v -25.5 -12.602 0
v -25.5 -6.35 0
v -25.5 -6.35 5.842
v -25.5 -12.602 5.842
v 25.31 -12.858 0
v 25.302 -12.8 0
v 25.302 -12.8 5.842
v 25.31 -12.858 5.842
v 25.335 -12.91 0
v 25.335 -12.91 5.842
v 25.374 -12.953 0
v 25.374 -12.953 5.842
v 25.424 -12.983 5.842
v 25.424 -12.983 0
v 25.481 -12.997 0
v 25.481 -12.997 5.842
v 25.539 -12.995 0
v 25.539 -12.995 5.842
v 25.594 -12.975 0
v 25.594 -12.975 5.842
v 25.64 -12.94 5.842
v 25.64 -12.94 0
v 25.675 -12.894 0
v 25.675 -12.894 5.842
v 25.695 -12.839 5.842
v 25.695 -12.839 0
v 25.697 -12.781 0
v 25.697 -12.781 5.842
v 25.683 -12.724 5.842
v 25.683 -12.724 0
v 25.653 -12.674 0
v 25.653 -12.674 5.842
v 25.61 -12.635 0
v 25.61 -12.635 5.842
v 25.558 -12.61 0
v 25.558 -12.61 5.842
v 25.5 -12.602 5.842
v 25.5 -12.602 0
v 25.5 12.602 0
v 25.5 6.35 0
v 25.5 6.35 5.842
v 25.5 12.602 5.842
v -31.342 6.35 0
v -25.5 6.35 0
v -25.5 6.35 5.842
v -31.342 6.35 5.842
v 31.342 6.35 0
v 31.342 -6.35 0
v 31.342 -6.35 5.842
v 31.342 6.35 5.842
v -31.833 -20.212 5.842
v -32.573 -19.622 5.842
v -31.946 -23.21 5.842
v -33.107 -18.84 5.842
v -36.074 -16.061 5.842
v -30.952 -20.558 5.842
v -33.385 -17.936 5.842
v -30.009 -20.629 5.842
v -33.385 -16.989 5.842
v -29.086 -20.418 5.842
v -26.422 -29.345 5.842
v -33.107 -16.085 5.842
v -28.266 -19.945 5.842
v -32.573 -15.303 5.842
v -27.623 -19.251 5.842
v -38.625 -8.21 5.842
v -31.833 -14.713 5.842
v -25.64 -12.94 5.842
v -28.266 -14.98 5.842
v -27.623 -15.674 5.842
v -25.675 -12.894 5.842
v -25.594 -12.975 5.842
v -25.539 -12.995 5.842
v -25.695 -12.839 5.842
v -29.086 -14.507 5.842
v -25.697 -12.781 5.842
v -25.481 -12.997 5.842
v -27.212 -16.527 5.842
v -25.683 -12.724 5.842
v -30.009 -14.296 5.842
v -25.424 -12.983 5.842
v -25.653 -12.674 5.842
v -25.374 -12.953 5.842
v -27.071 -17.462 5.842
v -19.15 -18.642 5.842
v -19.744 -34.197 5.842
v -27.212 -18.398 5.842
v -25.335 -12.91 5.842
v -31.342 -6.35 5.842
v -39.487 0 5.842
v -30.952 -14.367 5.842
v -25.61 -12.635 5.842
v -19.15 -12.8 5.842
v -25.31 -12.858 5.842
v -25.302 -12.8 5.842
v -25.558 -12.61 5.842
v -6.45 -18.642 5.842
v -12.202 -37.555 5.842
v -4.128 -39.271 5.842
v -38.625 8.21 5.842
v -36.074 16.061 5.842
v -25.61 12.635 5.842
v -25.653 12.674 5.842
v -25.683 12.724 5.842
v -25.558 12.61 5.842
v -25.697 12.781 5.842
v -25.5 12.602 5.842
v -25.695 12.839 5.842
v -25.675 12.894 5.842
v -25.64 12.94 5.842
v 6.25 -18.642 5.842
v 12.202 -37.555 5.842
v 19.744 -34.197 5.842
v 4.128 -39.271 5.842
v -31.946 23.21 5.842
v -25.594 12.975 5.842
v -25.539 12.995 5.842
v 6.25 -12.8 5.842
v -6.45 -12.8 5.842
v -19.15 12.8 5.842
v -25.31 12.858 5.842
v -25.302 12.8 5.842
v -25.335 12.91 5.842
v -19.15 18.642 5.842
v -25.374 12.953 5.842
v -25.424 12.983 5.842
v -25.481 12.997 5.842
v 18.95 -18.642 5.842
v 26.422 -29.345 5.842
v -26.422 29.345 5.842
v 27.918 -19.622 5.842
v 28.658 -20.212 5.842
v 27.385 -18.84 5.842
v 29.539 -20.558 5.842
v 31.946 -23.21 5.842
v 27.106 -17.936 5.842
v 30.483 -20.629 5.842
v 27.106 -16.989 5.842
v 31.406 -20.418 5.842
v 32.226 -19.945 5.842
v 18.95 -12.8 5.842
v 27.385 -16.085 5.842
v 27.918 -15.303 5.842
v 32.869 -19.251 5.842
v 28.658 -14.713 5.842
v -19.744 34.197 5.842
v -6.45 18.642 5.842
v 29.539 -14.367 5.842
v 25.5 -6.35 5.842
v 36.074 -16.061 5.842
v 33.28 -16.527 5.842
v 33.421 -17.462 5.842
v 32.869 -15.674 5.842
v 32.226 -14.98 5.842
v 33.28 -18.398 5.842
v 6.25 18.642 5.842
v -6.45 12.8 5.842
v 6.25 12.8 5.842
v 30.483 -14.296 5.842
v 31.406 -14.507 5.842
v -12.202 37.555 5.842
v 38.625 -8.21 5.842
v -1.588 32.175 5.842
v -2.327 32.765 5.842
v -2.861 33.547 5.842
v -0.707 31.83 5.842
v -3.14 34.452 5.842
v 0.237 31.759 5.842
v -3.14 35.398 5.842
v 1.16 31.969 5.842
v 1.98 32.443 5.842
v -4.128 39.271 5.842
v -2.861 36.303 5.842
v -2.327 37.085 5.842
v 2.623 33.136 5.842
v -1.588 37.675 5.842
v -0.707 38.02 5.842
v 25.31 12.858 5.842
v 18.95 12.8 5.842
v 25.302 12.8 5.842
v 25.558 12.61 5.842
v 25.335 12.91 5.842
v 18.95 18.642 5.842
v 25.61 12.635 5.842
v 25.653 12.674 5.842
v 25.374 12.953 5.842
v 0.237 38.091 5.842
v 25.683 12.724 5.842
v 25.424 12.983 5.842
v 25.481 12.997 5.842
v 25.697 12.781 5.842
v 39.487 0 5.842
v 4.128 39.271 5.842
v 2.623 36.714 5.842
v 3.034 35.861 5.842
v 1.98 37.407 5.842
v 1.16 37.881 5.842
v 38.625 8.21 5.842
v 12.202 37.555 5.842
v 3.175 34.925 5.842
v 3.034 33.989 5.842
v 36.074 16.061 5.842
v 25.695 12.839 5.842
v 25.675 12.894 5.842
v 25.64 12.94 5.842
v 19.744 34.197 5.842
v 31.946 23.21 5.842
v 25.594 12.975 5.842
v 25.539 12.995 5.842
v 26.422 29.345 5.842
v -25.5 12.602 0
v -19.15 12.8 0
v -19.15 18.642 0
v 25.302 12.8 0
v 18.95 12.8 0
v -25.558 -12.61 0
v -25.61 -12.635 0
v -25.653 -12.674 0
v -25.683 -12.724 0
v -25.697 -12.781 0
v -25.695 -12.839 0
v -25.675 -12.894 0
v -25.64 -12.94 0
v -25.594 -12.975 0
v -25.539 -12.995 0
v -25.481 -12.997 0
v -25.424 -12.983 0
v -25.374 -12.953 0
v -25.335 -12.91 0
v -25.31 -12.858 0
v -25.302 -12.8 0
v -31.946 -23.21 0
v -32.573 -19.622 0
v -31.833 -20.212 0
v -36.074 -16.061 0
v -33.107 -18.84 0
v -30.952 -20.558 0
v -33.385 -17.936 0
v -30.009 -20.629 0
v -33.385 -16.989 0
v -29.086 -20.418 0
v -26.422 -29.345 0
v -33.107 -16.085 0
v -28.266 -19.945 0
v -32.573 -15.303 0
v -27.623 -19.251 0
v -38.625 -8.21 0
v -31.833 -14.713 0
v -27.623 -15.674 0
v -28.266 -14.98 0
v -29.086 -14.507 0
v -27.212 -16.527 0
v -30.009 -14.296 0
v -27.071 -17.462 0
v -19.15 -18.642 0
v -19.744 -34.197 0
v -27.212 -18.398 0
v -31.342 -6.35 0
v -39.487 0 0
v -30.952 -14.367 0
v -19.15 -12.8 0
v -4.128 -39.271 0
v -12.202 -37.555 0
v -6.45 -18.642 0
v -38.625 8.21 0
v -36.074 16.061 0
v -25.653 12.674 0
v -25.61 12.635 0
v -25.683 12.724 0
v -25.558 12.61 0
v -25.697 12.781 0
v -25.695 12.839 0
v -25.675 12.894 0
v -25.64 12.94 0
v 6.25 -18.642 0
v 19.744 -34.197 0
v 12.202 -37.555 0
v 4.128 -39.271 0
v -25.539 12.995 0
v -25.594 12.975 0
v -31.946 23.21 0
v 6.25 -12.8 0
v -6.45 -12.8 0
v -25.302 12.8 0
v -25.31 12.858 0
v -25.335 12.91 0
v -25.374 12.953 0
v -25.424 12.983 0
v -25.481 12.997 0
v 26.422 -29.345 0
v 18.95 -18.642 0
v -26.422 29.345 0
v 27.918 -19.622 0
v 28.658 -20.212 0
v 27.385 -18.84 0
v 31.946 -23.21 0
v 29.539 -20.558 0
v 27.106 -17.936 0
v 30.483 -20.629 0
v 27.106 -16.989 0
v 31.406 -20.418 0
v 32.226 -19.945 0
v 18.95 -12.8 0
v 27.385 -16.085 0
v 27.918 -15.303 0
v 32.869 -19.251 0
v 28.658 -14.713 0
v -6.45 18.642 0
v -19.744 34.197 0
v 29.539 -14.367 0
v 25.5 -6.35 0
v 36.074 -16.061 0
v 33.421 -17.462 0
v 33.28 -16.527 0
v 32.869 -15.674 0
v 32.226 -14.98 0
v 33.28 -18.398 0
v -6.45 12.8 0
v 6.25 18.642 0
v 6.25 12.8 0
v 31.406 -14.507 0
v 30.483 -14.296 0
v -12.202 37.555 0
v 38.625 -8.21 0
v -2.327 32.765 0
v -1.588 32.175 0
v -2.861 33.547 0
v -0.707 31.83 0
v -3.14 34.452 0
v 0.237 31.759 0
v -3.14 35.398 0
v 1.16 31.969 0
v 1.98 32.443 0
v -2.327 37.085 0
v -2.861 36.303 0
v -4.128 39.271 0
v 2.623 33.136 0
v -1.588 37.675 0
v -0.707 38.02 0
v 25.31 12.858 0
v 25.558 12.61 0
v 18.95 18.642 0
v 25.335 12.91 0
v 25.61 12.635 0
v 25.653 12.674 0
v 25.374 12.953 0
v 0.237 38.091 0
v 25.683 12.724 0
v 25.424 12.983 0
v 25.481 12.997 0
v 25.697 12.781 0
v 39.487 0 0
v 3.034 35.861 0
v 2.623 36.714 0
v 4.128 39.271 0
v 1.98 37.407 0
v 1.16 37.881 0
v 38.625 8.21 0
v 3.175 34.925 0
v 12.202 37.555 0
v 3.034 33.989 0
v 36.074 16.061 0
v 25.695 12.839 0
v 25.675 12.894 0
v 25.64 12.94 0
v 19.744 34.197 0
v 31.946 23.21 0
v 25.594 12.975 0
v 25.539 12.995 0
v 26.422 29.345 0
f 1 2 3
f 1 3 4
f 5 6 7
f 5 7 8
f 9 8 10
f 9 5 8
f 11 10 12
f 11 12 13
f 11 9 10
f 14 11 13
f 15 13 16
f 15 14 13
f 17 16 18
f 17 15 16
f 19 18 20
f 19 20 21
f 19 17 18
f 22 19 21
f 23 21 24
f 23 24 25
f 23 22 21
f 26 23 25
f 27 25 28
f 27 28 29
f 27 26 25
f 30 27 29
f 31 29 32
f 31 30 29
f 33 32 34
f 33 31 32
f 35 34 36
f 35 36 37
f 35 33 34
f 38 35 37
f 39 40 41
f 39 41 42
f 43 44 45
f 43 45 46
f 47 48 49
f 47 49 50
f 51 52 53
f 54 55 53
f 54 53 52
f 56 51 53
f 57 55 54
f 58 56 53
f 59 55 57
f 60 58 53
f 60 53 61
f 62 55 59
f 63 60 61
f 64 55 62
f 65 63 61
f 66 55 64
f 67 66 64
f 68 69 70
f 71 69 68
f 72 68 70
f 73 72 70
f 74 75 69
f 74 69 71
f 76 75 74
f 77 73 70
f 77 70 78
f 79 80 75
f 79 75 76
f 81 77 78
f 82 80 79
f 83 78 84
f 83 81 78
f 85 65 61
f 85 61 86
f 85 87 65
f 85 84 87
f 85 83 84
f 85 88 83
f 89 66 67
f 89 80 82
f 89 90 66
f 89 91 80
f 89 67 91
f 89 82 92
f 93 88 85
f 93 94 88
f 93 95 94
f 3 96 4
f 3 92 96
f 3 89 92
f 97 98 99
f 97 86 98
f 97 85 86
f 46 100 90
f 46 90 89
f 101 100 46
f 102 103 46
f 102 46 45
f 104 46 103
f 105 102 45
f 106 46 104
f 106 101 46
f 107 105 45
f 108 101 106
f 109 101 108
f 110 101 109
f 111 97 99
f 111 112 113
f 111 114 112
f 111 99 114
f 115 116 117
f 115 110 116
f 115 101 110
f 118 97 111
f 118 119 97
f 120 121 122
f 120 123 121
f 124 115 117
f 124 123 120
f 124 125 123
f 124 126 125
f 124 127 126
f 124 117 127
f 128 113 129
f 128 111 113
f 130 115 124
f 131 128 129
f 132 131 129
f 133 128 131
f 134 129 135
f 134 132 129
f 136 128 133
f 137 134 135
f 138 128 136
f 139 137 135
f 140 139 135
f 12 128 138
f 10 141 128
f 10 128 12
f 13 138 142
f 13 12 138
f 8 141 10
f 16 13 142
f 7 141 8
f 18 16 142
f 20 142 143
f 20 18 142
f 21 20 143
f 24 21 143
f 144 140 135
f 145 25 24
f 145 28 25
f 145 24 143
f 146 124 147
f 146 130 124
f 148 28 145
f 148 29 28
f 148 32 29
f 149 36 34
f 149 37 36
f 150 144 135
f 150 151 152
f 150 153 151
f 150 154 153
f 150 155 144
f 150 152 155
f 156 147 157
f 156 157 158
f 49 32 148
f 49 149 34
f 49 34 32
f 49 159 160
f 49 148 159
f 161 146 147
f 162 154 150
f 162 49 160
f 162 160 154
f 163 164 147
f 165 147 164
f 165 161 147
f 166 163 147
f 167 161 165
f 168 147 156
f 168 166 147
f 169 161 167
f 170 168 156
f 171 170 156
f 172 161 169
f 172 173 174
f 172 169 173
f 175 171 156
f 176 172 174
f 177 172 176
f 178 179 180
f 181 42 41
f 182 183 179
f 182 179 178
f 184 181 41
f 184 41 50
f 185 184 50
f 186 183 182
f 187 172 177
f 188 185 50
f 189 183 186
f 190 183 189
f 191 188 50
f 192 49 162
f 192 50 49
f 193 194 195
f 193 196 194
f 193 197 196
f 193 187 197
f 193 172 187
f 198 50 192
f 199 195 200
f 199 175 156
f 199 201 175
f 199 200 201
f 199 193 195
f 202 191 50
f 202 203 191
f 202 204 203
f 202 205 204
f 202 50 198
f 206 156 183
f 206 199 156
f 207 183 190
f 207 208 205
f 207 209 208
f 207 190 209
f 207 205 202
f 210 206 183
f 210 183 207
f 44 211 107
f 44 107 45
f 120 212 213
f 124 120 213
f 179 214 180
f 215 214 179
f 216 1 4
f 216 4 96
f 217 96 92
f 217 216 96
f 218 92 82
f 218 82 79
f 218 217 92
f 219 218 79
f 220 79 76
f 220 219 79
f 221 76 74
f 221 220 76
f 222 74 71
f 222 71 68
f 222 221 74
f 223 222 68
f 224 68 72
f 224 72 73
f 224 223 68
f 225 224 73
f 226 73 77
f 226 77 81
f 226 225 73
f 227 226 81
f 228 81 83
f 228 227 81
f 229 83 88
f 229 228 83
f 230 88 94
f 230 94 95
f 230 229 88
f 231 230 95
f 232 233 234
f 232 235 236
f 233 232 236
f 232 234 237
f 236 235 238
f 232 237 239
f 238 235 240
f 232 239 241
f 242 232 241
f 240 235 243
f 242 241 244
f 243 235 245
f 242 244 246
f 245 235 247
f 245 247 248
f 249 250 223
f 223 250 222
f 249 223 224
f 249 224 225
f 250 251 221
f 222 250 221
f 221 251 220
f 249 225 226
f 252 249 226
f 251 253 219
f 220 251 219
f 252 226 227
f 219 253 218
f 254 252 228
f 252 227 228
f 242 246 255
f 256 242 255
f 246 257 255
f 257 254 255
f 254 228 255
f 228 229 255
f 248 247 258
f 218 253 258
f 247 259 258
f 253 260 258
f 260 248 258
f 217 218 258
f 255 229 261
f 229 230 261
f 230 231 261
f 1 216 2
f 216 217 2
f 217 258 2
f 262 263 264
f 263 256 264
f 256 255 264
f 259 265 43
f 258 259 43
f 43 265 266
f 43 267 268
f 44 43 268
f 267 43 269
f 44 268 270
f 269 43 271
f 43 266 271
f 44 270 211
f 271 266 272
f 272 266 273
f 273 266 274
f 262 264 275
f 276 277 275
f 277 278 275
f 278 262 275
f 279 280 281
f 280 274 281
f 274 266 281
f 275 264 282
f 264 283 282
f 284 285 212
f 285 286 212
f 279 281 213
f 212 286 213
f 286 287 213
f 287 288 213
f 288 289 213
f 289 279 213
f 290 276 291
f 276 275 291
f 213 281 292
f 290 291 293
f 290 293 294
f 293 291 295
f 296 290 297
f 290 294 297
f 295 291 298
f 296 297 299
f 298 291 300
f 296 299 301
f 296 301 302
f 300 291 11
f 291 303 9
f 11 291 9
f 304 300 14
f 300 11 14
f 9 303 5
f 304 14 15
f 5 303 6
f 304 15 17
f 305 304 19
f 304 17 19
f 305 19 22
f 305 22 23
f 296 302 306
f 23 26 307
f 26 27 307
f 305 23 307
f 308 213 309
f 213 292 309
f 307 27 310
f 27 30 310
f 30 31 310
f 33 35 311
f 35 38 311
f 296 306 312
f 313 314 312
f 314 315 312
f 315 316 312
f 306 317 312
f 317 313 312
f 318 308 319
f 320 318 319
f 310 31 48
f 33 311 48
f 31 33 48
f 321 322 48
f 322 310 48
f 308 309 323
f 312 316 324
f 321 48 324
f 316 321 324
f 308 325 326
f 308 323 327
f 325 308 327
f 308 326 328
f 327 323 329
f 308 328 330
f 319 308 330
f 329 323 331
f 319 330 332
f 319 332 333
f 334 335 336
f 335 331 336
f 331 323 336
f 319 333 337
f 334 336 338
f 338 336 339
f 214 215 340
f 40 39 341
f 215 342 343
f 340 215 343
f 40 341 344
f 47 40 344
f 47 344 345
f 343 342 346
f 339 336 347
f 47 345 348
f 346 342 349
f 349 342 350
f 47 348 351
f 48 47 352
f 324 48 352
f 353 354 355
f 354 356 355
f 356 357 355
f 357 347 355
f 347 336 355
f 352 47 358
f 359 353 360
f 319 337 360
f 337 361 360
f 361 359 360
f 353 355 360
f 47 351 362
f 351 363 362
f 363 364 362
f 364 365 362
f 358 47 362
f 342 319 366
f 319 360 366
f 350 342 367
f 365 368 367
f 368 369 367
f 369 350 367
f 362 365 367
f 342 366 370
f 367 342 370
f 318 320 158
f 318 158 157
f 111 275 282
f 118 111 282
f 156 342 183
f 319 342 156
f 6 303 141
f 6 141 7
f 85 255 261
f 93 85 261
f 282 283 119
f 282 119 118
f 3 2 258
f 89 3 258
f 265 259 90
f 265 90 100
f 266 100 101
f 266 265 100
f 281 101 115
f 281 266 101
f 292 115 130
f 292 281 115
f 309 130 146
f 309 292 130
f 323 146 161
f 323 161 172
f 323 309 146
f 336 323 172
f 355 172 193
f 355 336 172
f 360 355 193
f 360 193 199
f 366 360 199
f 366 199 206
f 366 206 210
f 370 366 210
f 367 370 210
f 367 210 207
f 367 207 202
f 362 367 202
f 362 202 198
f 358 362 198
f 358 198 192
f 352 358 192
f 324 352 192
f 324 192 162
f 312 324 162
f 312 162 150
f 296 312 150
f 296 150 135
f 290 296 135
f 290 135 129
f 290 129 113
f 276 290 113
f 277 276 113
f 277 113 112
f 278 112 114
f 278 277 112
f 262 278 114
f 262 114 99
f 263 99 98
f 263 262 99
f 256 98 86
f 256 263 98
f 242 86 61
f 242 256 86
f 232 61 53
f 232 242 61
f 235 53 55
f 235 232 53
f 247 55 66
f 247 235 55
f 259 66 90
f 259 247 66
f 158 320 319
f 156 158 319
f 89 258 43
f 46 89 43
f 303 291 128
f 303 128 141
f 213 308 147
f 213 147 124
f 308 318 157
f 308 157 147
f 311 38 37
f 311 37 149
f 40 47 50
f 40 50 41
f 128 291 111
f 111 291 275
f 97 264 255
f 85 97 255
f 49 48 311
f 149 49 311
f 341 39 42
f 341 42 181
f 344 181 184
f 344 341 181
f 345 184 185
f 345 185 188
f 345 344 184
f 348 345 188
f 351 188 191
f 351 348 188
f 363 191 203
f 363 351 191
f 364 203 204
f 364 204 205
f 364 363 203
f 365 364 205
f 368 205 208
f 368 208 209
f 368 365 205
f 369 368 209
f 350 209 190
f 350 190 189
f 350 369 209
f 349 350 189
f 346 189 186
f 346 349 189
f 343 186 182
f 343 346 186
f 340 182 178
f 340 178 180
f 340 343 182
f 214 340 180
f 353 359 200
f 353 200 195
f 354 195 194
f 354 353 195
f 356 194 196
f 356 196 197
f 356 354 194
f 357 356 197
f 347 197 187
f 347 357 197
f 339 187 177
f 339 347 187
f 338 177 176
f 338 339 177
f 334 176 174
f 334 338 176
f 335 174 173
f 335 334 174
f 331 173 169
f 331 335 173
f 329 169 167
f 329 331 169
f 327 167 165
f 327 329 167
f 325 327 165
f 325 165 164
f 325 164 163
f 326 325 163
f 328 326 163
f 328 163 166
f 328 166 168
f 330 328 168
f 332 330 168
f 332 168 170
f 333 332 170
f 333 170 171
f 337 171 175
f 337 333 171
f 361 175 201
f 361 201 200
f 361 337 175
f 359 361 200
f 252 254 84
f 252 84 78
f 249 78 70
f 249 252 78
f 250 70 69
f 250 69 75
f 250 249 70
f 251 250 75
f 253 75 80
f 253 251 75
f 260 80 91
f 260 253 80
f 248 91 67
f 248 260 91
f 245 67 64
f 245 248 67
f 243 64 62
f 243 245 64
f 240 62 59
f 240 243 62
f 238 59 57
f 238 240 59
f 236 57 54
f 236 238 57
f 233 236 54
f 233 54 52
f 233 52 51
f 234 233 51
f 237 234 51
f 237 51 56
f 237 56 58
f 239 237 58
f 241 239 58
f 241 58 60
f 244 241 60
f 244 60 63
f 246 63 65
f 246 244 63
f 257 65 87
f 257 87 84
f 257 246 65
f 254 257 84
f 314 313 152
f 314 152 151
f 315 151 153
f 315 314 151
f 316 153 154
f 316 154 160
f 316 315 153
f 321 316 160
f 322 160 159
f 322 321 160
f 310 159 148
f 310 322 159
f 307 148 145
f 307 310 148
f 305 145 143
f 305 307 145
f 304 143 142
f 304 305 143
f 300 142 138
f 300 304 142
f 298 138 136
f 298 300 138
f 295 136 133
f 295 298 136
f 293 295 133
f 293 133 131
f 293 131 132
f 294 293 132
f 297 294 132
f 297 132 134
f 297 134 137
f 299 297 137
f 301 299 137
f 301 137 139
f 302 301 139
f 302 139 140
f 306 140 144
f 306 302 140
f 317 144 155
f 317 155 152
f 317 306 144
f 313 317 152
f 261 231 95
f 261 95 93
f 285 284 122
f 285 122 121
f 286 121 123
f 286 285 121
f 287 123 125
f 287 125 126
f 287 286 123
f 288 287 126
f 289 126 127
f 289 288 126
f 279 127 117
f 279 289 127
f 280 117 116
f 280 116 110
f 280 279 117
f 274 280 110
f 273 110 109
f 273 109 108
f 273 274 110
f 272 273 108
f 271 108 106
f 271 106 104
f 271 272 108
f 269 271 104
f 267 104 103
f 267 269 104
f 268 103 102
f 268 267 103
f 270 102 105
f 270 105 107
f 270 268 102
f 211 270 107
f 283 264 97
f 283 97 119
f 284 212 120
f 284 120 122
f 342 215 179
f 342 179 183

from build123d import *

# Parameters (mm, degrees)
SKETCH1_R           = 41.275
SKETCH1_R_2         = 3.175
BOSS_EXTRUDE1_DEPTH = 5.842
SKETCH7_R           = 41.275
SKETCH7_R_2         = 39.487499946
CUT_EXTRUDE3_DEPTH  = 59.663278241
SKETCH8_W           = 5.842
SKETCH8_H           = 12.7
SKETCH8_W_2         = 12.7
SKETCH8_H_2         = 5.842
CUT_EXTRUDE4_DEPTH  = 57.148501921


with BuildPart() as part:
    # Sketch1 → Boss-Extrude1 (new body)
    with BuildSketch(Plane.XY):
        Circle(SKETCH1_R)
        with Locations((0, 34.925)):
            Circle(SKETCH1_R_2, mode=Mode.SUBTRACT)
        with Locations((30.245937227, -17.4625)):
            Circle(SKETCH1_R_2, mode=Mode.SUBTRACT)
        with Locations((-30.245937227, -17.4625)):
            Circle(SKETCH1_R_2, mode=Mode.SUBTRACT)
        with BuildLine():
            Line((-25.3015625, -12.8), (25.3015625, -12.8))
            ThreePointArc((25.3015625, -12.8), (25.640316502, -12.940316502), (25.5, -12.6015625))
            Line((25.5, -12.6015625), (25.5, 12.6015625))
            ThreePointArc((25.5, 12.6015625), (25.640316502, 12.940316502), (25.3015625, 12.8))
            Line((25.3015625, 12.8), (-25.3015625, 12.8))
            ThreePointArc((-25.3015625, 12.8), (-25.640316502, 12.940316502), (-25.5, 12.6015625))
            Line((-25.5, 12.6015625), (-25.5, -12.6015625))
            ThreePointArc((-25.5, -12.6015625), (-25.640316502, -12.940316502), (-25.3015625, -12.8))
        make_face(mode=Mode.SUBTRACT)
    extrude(amount=BOSS_EXTRUDE1_DEPTH)

    # Sketch7 → Cut-Extrude3 (cut, through all)
    with BuildSketch(Plane(origin=(0, 0, 0), x_dir=(-1, 0, 0), z_dir=(0, 0, -1))):
        Circle(SKETCH7_R)
        Circle(SKETCH7_R_2, mode=Mode.SUBTRACT)
    extrude(amount=-CUT_EXTRUDE3_DEPTH, mode=Mode.SUBTRACT)

    # Sketch8 → Cut-Extrude4 (cut, through all)
    with BuildSketch(Plane(origin=(0, 0, 0), x_dir=(-1, 0, 0), z_dir=(0, 0, -1))):
        with Locations((-28.421, 0)):
            Rectangle(SKETCH8_W, SKETCH8_H)
        with Locations((-12.599996942, 15.721)):
            Rectangle(SKETCH8_W_2, SKETCH8_H_2)
        with Locations((12.800003058, 15.721)):
            Rectangle(SKETCH8_W_2, SKETCH8_H_2)
        with Locations((12.800003058, -15.721)):
            Rectangle(SKETCH8_W_2, SKETCH8_H_2)
        with Locations((-12.599996942, -15.721)):
            Rectangle(SKETCH8_W_2, SKETCH8_H_2)
        with Locations((28.421, 0)):
            Rectangle(SKETCH8_W, SKETCH8_H)
    extrude(amount=-CUT_EXTRUDE4_DEPTH, mode=Mode.SUBTRACT)


solid = part.part
